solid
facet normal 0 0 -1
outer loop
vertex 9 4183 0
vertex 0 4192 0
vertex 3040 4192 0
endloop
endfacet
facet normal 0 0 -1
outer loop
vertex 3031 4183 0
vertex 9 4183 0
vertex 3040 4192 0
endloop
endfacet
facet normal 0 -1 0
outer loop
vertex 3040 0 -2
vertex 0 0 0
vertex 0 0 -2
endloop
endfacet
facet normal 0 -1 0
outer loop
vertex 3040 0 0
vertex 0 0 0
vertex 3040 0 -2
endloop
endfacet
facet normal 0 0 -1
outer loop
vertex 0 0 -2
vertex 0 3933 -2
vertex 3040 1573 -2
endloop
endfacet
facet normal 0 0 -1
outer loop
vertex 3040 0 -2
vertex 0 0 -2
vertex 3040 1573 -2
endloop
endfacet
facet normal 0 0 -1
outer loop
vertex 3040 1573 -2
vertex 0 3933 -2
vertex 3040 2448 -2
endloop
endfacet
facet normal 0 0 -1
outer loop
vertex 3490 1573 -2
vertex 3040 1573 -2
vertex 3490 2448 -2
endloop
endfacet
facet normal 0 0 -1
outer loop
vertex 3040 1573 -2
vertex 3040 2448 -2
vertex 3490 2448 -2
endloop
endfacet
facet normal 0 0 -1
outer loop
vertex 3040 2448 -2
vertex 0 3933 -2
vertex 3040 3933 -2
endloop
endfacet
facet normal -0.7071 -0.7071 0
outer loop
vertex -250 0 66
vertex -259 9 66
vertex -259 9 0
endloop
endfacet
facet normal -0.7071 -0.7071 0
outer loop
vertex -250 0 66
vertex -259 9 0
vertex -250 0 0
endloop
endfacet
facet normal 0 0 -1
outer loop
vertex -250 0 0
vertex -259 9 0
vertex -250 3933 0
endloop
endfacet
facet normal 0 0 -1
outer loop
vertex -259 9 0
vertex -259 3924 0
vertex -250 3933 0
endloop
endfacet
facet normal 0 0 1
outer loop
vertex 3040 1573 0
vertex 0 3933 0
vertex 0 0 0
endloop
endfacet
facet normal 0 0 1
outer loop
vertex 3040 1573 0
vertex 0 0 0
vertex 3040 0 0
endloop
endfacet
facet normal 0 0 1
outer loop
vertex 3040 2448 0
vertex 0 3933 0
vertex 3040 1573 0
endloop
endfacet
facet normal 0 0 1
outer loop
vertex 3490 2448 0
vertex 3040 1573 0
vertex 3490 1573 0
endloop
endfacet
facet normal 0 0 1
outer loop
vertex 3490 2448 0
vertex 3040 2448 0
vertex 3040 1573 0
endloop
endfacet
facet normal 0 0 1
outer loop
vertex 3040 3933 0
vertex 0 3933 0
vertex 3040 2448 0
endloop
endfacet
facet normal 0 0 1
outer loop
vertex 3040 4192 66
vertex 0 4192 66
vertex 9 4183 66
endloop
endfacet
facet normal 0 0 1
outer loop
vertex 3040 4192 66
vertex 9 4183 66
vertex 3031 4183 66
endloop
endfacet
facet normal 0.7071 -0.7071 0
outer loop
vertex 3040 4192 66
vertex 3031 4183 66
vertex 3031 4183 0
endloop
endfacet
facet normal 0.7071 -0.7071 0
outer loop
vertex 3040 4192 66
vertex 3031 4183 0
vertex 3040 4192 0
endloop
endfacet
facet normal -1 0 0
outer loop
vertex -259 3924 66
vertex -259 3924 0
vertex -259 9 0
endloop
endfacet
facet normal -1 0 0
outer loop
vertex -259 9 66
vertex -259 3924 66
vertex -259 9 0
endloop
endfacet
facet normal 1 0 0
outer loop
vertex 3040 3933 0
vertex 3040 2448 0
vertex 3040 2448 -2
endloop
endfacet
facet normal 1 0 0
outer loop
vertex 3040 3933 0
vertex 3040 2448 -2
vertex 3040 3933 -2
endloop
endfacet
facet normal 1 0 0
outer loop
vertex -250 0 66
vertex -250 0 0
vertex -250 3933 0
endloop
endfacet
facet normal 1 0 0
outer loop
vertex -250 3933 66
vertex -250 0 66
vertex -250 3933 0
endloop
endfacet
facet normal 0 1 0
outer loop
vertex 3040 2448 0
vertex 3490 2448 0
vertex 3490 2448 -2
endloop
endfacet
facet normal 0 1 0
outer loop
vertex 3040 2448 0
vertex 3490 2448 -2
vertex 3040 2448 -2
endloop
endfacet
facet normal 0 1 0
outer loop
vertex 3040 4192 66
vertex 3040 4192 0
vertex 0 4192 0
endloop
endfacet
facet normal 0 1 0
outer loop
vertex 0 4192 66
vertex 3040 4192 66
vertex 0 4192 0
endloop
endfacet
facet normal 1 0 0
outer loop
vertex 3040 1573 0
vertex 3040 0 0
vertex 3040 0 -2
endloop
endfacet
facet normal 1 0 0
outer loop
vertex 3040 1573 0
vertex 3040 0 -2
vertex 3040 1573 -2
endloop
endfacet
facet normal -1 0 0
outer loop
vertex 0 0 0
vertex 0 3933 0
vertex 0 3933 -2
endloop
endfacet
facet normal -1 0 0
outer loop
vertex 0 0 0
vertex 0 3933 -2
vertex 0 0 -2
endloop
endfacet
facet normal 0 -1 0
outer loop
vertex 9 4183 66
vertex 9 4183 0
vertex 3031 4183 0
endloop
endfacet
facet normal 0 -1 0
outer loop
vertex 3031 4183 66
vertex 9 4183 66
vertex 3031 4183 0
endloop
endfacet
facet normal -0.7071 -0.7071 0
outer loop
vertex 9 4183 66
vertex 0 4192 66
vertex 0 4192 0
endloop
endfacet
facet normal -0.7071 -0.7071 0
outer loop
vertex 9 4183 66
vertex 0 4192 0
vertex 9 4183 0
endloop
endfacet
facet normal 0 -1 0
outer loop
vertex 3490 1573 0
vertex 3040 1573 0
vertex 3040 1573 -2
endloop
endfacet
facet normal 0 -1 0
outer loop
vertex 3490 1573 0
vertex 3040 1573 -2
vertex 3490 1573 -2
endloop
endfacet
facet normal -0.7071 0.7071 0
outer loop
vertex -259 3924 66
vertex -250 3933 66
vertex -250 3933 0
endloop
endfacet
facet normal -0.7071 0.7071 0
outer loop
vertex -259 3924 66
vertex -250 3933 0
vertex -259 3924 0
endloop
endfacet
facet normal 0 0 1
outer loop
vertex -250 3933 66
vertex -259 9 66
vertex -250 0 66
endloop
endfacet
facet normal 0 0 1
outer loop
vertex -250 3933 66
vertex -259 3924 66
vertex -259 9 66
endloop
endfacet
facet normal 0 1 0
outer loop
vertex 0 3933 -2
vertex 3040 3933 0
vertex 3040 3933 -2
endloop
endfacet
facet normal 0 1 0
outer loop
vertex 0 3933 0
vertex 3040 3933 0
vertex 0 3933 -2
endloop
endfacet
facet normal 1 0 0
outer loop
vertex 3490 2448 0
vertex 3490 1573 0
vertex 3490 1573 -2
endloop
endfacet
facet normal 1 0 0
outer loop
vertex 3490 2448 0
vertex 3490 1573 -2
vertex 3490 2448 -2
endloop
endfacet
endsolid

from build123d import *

# Parameters (mm, degrees)
F1_DEPTH = 2
F3_DEPTH = 66
F5_DEPTH = 66


with BuildPart() as f1:
    # F0 (on Top) → F1 (new body)
    with BuildSketch(Plane.XY):
        Polygon((0, 3933), (0, 0), (3040, 0), (3040, 1573), (3490, 1573), (3490, 2448), (3040, 2448), (3040, 3933), align=None)
    extrude(amount=-F1_DEPTH)


with BuildPart() as f3:
    # F2 (on Top) → F3 (new body)
    with BuildSketch(Plane.XY):
        Polygon((-259, 9), (-250, 0), (-250, 3933), (-259, 3924), align=None)
    extrude(amount=F3_DEPTH)


with BuildPart() as f5:
    # F4 (on Top) → F5 (new body)
    with BuildSketch(Plane.XY):
        Polygon((3040, 4192), (0, 4192), (9, 4183), (3031, 4183), align=None)
    extrude(amount=F5_DEPTH)


solid = Compound([f1.part, f3.part, f5.part])
